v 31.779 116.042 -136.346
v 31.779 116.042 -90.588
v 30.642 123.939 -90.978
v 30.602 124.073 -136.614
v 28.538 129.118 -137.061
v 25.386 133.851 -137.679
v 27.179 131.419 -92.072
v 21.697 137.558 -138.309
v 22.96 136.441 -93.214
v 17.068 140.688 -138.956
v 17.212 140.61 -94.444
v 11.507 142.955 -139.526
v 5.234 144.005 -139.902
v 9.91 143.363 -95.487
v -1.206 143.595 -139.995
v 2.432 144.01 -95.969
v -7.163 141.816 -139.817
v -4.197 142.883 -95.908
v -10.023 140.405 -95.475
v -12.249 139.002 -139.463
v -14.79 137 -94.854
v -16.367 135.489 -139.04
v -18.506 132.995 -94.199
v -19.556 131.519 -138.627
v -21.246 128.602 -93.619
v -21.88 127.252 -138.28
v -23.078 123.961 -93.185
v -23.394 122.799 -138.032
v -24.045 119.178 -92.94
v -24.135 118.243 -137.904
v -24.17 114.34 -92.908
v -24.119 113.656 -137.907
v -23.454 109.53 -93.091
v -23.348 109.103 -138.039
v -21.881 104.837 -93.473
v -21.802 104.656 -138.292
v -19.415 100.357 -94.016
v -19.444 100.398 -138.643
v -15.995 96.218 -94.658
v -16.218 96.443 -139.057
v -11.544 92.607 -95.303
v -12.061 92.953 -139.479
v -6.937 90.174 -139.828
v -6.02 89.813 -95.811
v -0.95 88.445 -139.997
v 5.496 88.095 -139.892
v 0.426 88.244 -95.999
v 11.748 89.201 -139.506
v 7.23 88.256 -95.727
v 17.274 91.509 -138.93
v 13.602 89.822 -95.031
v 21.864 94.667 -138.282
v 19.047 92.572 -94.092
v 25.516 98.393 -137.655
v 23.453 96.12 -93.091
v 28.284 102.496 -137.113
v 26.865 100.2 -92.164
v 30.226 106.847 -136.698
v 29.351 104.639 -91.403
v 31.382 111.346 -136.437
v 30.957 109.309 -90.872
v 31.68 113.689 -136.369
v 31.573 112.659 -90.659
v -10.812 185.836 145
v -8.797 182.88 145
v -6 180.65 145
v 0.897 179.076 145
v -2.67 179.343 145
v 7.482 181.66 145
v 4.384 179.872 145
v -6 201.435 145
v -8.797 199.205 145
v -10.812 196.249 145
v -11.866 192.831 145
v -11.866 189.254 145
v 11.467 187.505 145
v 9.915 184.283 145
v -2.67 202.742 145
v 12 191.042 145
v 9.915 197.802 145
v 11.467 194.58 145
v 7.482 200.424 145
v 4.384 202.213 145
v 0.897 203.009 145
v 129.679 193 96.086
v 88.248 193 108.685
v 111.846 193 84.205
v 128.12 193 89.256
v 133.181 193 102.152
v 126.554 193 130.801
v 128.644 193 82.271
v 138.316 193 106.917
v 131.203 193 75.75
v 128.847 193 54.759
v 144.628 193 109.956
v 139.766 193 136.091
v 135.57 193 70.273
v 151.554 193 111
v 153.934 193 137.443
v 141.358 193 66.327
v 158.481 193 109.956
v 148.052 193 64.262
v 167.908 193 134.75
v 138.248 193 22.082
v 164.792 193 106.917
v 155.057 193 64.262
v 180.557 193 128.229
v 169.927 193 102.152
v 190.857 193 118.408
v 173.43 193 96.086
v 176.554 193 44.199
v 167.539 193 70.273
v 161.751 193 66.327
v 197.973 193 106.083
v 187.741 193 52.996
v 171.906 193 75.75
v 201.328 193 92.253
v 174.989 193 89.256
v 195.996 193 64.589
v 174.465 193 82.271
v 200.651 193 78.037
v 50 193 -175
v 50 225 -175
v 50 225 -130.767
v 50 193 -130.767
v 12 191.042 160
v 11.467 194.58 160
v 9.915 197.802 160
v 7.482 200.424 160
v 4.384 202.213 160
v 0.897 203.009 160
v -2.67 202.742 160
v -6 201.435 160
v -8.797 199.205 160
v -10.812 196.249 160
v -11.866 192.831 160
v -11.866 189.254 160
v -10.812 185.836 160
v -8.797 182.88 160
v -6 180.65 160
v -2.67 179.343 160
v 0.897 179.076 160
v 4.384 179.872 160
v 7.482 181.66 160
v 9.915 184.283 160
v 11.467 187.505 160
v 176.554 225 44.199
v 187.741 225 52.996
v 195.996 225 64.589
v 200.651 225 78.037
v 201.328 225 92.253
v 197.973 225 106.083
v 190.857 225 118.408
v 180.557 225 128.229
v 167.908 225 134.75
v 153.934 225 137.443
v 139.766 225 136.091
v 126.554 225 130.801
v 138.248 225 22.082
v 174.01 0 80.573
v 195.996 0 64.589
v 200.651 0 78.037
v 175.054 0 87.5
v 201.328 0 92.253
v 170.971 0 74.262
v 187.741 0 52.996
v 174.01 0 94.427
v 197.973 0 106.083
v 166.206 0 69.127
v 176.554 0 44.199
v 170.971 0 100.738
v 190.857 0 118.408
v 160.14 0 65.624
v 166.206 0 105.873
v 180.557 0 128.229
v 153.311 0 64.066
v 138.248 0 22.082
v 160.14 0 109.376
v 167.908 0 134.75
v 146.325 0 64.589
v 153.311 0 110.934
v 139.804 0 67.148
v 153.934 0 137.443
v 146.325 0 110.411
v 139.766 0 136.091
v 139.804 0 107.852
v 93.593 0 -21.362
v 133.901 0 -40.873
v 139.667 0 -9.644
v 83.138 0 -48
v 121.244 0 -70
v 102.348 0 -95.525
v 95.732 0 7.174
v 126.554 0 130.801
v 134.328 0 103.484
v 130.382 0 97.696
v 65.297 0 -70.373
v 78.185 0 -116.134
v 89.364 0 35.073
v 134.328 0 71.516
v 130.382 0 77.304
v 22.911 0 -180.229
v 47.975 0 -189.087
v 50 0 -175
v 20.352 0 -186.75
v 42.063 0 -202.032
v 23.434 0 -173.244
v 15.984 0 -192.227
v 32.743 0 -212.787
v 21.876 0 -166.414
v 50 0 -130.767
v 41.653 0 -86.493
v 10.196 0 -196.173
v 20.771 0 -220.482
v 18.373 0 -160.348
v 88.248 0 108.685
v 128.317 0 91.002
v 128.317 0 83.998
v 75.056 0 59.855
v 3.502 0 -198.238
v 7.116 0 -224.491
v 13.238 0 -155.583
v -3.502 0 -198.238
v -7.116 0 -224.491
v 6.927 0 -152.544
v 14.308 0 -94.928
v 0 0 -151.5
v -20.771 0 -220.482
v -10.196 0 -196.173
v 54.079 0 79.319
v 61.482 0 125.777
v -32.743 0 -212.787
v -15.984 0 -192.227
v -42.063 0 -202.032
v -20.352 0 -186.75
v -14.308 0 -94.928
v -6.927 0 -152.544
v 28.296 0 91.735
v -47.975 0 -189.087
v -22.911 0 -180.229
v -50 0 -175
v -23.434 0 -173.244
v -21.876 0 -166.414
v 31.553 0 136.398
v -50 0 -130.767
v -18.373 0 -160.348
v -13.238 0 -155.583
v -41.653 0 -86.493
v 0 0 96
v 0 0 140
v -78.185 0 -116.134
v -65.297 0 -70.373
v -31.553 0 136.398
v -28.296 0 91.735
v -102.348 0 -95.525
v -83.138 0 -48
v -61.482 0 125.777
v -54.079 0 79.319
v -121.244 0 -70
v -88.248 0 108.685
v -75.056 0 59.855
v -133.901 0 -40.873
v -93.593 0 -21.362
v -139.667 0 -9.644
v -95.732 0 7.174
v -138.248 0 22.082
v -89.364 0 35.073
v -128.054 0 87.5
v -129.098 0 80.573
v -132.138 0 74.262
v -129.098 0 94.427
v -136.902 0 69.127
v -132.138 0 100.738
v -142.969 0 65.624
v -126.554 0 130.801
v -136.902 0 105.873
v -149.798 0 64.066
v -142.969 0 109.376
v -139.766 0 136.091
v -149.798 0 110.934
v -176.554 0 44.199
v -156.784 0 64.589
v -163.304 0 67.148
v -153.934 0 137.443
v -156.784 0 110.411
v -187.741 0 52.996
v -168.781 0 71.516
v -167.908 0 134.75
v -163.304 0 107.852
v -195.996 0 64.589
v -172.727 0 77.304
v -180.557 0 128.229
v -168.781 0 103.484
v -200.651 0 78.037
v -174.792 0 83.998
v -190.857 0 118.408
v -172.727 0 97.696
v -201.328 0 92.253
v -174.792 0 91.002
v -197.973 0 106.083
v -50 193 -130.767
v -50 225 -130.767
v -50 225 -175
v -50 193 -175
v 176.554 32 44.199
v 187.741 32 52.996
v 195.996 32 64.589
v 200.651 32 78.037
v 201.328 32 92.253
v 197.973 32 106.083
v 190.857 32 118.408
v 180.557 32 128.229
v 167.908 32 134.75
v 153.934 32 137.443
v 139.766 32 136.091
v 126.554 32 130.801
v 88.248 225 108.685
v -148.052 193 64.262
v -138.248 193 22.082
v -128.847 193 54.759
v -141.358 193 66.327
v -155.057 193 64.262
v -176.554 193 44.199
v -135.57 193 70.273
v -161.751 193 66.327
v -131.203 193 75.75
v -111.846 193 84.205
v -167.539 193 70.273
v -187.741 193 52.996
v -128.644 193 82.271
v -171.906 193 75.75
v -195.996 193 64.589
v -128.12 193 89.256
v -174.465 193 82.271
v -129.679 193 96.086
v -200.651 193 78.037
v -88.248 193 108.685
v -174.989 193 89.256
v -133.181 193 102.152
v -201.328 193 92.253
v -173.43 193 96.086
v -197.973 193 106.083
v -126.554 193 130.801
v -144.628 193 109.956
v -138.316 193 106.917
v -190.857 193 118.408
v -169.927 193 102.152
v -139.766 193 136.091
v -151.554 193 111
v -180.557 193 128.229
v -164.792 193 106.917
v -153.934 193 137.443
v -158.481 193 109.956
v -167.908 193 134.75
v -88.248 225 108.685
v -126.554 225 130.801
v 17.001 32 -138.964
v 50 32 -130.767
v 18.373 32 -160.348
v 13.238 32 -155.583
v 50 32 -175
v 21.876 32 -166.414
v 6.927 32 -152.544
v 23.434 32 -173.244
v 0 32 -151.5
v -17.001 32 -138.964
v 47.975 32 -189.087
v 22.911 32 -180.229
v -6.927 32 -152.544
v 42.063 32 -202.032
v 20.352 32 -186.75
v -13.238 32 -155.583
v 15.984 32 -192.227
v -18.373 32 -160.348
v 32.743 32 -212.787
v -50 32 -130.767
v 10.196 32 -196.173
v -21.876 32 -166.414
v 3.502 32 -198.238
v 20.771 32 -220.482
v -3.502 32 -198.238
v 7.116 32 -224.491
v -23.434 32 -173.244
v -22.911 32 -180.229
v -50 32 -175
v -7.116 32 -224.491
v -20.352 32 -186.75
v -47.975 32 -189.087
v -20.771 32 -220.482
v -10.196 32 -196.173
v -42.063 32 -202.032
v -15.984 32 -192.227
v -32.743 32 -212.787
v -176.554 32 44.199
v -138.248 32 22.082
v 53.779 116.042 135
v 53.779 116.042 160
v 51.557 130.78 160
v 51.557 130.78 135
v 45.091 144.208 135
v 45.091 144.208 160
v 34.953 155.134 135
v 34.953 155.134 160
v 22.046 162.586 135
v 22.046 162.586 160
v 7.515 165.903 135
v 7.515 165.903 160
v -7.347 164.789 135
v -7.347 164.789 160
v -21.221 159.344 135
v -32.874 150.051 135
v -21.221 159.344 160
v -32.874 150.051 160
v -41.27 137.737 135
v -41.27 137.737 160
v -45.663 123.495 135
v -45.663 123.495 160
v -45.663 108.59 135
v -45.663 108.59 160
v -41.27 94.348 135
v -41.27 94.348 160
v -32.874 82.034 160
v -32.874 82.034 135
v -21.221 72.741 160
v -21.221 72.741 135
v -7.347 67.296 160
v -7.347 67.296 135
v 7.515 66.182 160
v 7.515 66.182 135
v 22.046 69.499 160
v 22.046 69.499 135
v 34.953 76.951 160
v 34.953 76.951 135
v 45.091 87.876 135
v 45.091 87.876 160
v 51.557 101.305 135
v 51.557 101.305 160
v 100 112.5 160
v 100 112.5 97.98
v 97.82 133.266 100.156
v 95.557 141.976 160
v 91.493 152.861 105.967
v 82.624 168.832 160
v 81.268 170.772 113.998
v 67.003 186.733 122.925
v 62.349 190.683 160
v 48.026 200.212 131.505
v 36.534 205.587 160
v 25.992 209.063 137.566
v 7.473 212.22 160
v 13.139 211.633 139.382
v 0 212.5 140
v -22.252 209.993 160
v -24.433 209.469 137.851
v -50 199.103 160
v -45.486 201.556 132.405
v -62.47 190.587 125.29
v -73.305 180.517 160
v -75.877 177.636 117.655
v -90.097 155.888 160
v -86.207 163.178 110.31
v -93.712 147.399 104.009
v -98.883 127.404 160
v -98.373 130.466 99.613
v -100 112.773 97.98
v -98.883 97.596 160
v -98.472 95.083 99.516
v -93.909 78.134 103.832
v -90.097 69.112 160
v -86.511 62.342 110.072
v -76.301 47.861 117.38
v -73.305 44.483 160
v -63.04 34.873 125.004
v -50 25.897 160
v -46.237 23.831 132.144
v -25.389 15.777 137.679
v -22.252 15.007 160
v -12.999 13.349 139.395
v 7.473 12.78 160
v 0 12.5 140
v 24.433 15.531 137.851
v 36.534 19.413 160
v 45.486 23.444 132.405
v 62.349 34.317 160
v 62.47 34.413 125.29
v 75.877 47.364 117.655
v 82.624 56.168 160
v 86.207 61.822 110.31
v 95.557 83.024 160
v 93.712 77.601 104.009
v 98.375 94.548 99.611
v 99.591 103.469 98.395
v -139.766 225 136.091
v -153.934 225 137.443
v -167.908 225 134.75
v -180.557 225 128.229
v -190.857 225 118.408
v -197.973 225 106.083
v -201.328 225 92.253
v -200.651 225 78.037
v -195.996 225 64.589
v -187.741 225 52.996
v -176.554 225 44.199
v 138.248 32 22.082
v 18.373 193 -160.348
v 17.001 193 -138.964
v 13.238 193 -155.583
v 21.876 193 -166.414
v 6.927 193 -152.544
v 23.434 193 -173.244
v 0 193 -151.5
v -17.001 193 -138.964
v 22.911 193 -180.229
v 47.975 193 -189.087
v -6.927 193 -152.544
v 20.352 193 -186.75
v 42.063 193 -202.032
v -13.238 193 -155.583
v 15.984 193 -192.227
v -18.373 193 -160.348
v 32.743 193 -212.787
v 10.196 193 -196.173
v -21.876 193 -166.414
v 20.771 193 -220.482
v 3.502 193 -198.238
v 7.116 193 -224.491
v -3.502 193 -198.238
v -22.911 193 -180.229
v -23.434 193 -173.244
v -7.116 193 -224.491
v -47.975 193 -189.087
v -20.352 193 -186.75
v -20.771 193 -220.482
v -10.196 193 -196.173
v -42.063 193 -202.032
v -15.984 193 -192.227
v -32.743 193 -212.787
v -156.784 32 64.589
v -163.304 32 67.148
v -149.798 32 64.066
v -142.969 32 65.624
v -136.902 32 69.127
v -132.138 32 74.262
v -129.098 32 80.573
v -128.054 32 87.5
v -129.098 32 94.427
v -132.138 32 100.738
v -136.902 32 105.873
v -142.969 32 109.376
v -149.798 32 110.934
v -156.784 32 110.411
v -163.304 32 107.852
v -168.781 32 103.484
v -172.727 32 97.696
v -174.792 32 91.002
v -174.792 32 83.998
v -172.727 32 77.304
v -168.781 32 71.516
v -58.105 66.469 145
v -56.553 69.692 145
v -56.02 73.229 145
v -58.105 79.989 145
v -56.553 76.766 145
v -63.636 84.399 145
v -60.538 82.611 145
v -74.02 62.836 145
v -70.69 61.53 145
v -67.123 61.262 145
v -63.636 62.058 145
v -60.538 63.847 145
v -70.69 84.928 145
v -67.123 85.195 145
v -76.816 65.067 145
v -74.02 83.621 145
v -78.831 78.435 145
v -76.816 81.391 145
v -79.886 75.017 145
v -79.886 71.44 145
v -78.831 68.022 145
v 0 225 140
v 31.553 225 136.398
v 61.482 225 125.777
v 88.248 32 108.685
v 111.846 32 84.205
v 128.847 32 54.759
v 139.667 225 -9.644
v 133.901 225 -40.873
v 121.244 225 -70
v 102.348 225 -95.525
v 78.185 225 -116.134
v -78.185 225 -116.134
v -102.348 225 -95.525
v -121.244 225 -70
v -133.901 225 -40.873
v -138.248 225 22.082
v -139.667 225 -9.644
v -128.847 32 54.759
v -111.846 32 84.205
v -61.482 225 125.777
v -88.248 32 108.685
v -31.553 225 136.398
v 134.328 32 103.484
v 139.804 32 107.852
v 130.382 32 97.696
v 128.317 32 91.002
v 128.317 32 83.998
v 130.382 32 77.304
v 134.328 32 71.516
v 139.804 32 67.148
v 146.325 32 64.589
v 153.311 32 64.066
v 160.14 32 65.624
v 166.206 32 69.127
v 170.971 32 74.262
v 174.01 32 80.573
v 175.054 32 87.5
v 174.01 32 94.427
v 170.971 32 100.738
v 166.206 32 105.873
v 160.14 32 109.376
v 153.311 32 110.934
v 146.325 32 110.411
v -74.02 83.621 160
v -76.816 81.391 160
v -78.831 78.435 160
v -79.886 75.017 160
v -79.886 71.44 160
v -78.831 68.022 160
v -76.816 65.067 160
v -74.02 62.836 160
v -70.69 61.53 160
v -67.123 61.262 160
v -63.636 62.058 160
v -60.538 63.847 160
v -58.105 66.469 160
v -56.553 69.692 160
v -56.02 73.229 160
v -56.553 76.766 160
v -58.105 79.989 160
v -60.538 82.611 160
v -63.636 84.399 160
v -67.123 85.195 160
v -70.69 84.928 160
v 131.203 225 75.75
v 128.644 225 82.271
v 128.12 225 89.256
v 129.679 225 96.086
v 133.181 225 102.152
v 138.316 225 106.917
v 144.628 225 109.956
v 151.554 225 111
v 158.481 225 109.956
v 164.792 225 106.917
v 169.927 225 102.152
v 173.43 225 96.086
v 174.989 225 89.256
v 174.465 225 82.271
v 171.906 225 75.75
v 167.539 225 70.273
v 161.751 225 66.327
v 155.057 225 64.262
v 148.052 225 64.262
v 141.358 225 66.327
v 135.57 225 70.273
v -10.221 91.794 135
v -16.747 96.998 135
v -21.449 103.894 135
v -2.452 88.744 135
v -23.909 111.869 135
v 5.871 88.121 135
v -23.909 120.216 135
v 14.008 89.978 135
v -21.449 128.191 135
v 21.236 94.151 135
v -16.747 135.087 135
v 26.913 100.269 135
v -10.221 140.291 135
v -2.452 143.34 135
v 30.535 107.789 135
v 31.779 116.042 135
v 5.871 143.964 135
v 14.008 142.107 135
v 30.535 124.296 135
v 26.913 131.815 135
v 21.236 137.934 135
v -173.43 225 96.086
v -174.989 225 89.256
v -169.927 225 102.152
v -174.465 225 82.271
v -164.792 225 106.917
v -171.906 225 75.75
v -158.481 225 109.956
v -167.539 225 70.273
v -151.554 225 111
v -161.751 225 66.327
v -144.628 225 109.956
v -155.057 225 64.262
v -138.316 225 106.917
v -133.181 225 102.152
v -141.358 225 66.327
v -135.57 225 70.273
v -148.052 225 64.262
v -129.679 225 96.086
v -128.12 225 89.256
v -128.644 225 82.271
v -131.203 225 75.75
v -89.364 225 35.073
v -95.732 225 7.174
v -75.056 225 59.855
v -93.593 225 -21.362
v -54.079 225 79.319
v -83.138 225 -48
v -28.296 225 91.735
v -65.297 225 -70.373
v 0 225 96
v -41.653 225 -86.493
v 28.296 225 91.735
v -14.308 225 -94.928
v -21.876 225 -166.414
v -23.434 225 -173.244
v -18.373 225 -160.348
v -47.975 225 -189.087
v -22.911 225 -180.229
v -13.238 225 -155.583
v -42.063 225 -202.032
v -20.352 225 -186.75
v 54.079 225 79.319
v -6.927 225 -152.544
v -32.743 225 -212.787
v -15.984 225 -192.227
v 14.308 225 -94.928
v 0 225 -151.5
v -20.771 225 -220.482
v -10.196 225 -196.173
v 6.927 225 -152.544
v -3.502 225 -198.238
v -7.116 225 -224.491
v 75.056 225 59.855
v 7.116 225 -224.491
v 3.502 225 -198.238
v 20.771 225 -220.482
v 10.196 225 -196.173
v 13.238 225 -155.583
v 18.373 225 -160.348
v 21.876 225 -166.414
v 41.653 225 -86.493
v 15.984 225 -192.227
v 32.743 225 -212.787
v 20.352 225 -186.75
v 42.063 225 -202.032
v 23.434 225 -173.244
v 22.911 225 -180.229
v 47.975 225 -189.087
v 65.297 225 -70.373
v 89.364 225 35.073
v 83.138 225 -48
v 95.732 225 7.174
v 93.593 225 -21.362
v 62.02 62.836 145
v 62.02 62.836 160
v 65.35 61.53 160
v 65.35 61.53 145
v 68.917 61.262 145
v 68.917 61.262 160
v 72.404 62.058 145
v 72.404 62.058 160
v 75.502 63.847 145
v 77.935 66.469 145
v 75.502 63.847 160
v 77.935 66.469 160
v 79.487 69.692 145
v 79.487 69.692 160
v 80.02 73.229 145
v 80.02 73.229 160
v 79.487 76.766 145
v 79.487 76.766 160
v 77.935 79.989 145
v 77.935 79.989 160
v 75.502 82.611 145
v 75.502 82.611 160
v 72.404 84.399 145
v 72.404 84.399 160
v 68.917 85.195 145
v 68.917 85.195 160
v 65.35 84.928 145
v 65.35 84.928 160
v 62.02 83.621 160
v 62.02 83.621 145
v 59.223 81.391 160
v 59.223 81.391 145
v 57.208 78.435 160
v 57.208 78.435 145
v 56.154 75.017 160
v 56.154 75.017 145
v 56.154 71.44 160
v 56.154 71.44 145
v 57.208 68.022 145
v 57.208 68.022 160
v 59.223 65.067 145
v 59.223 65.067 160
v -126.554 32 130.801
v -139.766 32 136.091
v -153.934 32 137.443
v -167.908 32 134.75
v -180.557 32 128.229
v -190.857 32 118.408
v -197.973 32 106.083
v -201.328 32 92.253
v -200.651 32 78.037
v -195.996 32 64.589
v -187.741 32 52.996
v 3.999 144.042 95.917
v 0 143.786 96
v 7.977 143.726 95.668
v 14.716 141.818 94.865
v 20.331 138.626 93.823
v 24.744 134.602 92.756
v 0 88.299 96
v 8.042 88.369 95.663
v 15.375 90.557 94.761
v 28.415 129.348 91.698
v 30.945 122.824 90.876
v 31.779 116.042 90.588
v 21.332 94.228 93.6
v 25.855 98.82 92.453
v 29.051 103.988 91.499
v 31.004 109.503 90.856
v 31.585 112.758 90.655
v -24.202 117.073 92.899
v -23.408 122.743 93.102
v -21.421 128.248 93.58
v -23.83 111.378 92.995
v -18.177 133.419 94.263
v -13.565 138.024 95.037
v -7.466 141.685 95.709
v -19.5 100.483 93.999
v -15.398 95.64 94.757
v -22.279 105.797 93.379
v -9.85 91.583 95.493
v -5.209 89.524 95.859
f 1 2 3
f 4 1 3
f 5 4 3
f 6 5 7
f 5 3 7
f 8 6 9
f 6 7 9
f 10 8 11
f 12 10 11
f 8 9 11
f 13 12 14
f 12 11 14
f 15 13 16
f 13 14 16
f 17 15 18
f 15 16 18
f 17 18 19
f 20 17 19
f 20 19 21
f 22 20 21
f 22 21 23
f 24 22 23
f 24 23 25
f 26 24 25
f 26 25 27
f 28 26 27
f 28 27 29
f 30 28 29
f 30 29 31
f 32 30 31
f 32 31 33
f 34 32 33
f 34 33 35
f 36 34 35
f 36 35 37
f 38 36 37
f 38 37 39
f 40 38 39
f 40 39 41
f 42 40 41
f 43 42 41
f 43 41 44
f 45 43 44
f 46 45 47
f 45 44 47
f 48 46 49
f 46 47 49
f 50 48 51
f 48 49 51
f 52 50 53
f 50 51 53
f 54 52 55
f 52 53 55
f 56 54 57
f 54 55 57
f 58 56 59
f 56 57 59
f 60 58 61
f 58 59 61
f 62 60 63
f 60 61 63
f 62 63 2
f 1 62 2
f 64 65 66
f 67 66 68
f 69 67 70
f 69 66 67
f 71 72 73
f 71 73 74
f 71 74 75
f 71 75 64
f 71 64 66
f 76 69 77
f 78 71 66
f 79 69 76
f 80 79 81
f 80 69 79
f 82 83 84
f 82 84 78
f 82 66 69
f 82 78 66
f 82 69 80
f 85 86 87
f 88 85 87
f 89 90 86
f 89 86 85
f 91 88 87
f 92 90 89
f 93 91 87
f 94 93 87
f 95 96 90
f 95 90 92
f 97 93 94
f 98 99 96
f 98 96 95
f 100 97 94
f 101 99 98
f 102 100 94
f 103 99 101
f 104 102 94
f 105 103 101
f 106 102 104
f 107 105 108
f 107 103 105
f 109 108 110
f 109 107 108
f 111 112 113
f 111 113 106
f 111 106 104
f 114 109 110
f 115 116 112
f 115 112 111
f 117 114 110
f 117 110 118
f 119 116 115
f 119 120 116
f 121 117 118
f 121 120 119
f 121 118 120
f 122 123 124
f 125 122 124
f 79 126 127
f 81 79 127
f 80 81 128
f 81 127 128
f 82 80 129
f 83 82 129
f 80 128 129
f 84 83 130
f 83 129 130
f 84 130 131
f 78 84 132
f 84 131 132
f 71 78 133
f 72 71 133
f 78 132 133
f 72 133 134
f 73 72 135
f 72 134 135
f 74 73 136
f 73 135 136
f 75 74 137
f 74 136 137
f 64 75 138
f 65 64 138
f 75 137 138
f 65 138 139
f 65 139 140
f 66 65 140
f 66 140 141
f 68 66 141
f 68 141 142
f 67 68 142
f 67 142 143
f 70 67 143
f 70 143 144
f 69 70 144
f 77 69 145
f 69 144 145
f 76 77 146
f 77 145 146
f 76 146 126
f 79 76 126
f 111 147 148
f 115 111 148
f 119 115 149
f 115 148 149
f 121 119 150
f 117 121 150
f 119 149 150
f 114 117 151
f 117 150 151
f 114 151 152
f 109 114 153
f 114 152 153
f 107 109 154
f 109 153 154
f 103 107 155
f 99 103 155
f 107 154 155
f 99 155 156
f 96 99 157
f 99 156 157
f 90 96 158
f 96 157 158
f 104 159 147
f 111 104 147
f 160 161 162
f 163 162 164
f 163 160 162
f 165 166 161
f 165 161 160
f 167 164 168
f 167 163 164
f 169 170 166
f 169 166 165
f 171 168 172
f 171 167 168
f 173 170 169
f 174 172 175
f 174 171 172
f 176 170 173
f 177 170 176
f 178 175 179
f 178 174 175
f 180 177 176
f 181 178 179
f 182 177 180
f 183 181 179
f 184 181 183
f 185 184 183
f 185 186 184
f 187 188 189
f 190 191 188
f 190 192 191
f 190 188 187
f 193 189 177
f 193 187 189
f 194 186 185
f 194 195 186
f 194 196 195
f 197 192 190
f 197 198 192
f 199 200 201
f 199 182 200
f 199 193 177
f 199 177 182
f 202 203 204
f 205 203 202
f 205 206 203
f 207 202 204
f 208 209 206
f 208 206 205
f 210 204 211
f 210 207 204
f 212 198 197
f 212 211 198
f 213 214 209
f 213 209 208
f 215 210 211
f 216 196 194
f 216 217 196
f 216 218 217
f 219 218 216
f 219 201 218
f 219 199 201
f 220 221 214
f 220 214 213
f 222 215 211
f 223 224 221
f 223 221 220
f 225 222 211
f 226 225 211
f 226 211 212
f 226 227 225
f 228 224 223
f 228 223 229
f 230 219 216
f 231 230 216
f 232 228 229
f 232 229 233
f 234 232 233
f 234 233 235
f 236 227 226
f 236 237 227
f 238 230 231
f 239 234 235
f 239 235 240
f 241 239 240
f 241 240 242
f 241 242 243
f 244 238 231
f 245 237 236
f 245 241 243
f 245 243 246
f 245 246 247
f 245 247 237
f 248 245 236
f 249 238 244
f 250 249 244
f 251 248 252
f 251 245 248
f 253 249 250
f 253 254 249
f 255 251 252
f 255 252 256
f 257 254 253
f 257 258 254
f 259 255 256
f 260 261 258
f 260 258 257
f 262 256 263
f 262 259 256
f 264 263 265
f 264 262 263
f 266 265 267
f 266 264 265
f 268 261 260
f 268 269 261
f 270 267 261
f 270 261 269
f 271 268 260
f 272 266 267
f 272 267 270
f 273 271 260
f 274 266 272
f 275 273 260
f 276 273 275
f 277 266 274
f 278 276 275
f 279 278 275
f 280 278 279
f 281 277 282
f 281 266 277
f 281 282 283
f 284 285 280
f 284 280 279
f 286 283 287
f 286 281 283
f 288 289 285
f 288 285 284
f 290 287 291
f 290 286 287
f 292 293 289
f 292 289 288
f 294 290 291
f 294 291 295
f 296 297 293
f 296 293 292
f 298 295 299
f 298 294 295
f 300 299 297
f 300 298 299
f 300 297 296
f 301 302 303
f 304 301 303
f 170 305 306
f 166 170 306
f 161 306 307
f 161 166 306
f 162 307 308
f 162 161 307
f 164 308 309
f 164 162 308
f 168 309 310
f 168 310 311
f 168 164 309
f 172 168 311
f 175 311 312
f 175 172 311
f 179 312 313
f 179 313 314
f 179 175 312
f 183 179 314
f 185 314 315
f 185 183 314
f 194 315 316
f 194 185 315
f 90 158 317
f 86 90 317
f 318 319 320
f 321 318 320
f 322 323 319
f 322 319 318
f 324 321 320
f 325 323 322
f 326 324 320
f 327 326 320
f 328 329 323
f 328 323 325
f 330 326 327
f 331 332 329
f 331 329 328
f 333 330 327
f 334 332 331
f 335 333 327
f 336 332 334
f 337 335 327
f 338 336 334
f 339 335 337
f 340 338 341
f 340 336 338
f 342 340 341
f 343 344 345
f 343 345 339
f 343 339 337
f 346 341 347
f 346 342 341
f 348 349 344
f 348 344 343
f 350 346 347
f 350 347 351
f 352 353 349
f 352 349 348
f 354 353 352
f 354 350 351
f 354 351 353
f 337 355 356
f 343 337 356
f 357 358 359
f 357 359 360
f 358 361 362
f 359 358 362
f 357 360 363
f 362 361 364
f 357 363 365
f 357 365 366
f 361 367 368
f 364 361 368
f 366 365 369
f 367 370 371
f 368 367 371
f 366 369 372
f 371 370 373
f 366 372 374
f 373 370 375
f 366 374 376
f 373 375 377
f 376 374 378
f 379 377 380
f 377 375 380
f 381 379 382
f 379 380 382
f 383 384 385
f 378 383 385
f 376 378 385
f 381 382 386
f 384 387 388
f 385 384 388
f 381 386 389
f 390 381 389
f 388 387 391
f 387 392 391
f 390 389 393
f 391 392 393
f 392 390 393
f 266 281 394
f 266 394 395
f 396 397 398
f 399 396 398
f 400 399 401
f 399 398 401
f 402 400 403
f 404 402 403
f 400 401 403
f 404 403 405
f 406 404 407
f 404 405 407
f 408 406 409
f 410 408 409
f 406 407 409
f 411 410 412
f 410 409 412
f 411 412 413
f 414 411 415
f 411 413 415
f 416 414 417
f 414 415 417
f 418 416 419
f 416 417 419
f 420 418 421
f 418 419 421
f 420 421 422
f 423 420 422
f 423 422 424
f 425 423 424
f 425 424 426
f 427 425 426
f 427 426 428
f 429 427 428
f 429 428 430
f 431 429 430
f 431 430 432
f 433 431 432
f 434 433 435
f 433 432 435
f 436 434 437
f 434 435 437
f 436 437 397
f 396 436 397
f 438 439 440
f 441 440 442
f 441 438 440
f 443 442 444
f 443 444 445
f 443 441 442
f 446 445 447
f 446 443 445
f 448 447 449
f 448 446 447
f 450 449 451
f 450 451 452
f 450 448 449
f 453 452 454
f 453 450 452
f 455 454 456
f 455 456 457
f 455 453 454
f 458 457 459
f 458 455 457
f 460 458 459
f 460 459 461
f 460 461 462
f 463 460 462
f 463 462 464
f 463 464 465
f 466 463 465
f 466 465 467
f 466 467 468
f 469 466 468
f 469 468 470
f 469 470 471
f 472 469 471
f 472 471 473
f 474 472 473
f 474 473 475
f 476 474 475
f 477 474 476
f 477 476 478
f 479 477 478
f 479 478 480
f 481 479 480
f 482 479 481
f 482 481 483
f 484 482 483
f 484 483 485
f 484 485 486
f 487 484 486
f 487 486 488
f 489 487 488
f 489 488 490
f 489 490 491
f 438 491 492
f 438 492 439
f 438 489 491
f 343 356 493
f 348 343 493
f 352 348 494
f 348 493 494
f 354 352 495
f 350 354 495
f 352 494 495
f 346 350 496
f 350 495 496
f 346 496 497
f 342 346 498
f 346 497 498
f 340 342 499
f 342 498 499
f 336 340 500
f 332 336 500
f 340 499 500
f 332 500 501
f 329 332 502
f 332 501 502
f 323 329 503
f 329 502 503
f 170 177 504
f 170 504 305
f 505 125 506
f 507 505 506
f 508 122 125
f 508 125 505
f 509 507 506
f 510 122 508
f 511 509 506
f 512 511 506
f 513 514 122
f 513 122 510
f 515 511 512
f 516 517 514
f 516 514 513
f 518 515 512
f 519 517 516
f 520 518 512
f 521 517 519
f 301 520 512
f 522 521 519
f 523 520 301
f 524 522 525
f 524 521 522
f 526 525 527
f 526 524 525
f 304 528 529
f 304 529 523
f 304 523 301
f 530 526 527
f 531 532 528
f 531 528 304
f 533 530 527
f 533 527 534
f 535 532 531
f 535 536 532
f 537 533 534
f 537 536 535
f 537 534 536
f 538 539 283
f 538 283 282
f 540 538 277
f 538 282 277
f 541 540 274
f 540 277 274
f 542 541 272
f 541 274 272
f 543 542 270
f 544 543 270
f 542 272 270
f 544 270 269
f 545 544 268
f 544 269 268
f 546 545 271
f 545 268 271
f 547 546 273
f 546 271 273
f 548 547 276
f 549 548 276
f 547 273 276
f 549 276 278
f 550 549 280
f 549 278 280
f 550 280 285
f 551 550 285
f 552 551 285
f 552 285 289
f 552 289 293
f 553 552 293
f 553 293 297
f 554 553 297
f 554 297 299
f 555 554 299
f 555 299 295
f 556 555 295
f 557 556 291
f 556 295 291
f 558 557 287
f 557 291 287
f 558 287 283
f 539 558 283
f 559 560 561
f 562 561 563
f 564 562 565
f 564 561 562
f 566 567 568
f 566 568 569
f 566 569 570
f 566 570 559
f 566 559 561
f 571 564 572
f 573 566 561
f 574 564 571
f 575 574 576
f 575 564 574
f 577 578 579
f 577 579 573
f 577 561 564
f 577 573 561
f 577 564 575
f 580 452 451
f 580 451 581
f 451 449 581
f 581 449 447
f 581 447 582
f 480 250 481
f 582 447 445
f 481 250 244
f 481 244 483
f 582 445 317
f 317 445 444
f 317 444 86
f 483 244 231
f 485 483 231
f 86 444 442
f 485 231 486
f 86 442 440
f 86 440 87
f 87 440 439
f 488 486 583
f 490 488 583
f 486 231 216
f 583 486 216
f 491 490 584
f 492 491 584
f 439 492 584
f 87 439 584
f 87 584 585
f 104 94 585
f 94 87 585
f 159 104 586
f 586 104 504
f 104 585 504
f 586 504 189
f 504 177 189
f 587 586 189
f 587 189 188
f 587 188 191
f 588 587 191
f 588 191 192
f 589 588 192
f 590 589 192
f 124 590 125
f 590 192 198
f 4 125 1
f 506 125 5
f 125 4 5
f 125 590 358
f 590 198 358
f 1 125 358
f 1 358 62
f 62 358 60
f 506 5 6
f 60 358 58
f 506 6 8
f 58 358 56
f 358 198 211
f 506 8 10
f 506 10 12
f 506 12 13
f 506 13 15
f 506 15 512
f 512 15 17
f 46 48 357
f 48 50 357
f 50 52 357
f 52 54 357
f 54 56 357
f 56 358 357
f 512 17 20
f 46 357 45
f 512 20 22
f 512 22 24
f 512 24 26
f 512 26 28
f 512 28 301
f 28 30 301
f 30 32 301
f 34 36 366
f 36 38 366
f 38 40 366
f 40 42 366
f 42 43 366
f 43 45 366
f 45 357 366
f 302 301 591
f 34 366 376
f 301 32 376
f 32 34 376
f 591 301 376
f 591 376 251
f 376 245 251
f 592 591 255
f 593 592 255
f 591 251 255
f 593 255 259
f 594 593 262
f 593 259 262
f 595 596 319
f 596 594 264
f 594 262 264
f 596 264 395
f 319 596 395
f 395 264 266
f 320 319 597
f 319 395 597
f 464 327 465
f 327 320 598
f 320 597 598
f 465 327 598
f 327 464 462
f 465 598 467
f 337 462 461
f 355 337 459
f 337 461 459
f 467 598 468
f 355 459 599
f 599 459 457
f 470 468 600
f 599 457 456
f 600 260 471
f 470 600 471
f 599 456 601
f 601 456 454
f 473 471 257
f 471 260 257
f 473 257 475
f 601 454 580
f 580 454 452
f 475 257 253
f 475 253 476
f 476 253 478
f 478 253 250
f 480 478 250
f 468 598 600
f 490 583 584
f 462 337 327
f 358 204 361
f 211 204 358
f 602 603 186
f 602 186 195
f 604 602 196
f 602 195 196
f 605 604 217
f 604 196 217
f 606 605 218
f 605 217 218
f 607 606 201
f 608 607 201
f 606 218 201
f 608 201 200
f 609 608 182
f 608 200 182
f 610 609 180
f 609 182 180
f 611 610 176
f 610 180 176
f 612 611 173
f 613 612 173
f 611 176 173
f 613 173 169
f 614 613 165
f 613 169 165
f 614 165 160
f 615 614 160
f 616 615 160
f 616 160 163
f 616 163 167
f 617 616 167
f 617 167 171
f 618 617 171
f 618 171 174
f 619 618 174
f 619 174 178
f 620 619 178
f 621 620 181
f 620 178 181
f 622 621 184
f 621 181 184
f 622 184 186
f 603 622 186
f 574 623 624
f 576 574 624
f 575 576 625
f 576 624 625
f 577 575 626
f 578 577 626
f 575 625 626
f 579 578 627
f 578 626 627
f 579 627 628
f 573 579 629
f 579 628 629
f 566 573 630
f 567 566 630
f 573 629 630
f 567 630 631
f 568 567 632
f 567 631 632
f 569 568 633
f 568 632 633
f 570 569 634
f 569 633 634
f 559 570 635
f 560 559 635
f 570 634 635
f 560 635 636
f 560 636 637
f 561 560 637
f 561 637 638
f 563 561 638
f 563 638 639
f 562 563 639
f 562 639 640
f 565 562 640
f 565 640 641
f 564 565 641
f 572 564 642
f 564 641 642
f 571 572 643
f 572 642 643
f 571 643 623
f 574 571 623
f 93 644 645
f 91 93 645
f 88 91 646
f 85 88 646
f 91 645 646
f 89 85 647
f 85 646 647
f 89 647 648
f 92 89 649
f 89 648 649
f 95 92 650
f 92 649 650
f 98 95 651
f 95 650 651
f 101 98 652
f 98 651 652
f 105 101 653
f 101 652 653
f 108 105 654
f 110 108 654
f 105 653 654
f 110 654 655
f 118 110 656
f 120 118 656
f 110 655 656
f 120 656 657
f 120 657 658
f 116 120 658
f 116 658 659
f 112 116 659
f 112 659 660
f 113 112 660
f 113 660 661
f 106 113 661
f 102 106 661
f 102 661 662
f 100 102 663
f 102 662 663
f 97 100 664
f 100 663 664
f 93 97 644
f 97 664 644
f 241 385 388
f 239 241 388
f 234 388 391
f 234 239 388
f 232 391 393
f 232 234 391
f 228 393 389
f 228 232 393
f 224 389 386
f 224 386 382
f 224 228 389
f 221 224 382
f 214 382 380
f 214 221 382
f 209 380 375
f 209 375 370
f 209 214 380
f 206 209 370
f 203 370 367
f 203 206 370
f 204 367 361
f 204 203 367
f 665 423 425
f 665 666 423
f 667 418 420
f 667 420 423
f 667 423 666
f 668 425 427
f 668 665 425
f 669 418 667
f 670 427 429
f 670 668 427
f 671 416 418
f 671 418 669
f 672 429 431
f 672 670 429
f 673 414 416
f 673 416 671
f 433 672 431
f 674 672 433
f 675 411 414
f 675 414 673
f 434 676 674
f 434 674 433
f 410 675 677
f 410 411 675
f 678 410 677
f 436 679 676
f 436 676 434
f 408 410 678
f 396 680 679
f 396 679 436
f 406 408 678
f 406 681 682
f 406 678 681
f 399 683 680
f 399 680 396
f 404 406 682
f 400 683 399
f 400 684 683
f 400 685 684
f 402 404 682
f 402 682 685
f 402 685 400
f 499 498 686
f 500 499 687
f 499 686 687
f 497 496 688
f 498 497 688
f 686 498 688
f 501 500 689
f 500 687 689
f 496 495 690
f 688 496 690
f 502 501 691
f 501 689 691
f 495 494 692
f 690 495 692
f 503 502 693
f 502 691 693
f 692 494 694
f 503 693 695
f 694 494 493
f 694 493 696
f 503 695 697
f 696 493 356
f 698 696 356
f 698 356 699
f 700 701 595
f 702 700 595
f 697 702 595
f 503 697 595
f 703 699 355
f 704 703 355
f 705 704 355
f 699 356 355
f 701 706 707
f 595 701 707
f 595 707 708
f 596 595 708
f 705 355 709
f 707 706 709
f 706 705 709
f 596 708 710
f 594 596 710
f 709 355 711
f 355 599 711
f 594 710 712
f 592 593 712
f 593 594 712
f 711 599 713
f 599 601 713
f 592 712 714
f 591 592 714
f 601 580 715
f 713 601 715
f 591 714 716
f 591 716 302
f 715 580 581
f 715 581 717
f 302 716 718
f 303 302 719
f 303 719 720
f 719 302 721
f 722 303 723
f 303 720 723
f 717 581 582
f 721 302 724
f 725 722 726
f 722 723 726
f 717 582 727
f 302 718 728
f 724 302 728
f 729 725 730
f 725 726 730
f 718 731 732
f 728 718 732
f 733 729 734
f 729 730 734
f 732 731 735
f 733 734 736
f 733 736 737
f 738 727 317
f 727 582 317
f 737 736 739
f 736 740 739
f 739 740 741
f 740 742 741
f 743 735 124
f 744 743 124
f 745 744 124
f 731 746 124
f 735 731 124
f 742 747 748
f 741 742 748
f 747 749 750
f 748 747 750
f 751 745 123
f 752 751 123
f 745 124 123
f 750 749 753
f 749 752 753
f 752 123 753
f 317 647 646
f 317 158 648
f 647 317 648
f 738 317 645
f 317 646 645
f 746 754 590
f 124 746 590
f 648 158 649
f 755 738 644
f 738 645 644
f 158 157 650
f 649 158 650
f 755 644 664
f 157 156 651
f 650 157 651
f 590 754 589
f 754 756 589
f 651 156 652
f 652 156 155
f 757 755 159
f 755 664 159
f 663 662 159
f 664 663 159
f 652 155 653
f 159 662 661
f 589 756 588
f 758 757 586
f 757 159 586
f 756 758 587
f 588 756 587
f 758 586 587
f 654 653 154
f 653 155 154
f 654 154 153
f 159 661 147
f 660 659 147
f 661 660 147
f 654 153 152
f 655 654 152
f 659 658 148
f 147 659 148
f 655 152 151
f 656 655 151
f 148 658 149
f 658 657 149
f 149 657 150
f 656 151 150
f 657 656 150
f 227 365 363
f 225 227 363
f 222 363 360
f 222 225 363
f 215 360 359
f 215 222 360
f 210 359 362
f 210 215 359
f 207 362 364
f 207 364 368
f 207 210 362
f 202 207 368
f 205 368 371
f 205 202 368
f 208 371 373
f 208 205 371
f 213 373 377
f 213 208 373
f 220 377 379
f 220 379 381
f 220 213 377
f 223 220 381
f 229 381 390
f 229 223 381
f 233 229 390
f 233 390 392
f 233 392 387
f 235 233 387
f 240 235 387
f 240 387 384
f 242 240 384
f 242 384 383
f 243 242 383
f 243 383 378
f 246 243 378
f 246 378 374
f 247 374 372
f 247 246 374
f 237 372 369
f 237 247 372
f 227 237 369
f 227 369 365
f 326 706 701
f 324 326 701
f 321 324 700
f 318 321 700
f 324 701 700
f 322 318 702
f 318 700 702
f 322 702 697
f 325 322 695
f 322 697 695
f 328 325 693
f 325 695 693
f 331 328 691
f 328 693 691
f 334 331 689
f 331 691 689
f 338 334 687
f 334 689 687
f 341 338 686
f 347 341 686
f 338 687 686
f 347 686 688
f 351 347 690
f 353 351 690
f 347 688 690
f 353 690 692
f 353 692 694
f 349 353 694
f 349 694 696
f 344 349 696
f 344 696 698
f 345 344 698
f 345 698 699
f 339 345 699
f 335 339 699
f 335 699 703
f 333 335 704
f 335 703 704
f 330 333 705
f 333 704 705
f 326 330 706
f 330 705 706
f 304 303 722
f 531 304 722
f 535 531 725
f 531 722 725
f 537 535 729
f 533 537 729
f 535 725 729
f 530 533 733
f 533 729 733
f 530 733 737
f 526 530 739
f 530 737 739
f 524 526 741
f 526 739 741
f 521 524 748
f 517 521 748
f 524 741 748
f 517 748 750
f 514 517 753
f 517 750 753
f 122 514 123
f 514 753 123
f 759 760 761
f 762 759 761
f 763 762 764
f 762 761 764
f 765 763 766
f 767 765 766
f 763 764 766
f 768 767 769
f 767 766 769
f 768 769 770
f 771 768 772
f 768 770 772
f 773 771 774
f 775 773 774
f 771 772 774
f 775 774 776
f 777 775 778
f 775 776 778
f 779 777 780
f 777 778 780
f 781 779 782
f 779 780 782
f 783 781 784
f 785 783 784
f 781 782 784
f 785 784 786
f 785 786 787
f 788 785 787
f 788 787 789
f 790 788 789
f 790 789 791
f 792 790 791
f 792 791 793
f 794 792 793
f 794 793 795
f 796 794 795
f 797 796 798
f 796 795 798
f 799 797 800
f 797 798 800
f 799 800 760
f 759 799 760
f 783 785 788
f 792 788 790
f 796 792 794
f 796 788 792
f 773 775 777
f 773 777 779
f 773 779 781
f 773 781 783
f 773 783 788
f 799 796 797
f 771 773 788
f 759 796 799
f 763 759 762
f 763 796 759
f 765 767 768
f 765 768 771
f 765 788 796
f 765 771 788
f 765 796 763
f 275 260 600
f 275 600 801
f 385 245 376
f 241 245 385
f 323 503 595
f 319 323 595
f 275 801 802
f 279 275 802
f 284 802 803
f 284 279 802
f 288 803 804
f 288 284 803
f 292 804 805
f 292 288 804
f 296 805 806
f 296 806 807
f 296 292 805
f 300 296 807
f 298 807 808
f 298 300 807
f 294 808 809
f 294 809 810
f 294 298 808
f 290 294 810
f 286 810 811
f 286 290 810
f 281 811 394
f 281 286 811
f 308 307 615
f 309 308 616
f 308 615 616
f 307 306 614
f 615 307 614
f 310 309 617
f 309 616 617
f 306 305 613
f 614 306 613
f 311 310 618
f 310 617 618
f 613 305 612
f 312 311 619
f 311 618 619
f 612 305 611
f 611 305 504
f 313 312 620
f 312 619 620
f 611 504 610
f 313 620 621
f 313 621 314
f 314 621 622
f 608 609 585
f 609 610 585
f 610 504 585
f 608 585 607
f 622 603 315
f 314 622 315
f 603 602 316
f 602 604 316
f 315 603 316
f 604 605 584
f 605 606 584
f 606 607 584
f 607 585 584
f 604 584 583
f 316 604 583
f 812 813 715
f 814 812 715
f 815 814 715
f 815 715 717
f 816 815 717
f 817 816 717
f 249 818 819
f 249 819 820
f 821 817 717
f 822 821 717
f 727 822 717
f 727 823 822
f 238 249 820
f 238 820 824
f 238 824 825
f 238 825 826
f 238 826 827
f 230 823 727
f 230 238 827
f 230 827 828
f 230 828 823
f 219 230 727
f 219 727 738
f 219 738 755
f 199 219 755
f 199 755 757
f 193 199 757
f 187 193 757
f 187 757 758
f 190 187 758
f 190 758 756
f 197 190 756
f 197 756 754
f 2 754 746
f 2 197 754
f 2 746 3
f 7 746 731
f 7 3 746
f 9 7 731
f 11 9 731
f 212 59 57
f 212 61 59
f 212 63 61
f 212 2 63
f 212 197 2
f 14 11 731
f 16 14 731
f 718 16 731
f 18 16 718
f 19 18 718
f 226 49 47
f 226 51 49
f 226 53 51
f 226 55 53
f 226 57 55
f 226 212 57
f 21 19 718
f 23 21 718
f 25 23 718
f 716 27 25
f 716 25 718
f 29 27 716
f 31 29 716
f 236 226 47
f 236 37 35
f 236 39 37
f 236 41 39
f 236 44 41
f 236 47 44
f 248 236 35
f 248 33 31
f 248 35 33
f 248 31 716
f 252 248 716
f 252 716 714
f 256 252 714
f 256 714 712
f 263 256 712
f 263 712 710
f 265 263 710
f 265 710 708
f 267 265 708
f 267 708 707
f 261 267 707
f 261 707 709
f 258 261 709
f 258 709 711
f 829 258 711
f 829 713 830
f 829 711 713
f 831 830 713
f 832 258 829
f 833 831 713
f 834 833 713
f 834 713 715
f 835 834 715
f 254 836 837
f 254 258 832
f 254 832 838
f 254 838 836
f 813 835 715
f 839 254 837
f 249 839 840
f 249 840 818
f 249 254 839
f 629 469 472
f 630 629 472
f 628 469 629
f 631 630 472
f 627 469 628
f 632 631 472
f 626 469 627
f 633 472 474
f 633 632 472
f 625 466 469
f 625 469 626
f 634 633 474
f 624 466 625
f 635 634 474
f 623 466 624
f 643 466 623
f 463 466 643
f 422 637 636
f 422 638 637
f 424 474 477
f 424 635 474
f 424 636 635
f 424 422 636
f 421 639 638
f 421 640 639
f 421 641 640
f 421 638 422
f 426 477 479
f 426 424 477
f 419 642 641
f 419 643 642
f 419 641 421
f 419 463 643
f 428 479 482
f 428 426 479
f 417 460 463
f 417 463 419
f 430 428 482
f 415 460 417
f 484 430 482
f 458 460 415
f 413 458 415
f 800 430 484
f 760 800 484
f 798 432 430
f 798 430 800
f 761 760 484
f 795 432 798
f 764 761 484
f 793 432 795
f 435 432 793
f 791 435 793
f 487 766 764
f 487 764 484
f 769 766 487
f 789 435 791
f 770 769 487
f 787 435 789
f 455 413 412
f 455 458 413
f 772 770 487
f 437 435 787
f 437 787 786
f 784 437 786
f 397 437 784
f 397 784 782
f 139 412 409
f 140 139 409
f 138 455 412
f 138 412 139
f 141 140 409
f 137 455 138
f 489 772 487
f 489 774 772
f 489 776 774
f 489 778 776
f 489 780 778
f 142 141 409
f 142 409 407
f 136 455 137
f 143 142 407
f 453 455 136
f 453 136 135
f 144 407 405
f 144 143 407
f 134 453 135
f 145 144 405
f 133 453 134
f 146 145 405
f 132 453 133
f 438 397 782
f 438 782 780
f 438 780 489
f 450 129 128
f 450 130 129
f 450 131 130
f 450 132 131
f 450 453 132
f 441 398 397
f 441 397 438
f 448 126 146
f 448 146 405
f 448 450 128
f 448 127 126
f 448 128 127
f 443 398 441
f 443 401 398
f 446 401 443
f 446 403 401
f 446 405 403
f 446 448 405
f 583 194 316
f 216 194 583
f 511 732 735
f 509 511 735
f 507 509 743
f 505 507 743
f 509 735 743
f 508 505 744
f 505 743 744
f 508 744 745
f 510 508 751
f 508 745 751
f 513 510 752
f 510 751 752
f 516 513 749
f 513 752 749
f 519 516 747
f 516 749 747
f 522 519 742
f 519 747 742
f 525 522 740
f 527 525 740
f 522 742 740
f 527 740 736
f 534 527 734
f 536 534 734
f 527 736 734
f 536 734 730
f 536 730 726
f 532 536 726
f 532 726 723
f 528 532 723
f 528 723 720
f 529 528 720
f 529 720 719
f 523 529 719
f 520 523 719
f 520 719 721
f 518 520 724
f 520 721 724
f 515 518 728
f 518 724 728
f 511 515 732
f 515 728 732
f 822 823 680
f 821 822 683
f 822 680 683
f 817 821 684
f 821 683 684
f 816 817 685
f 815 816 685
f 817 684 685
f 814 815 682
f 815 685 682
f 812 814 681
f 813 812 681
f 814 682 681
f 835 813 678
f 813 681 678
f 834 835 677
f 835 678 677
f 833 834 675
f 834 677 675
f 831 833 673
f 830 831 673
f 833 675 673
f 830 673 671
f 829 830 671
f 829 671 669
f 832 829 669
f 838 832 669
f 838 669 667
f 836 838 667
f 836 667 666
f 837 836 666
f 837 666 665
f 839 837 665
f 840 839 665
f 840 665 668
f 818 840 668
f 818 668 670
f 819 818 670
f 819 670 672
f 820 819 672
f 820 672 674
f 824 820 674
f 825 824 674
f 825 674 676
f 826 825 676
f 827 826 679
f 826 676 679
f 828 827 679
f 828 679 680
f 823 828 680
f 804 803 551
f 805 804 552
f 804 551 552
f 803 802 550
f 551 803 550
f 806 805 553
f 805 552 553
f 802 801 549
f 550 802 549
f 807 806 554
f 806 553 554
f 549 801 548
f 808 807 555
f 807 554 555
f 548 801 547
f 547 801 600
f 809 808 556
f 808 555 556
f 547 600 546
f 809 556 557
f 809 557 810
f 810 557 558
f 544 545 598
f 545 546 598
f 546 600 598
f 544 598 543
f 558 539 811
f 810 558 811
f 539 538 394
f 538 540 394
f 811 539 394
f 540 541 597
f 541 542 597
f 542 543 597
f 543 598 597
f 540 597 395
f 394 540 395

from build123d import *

# Parameters (mm, degrees)
SKETCH1_R                = 140
SKETCH1_R_2              = 96
BOSS_EXTRUDE1_DEPTH      = 225
SKETCH2_R                = 23.5
BOSS_EXTRUDE2_DEPTH      = 32
CIRPATTERN1_COUNT        = 3
MIRROR1_COPY_1_SKETCH_R  = 23.5
MIRROR1_COPY_1_DEPTH     = 32
MIRROR1_COPY_2_SKETCH_R  = 23.5
MIRROR1_COPY_2_DEPTH     = 32
BOSS_EXTRUDE3_REACH      = 491.361
BOSS_EXTRUDE3_END_RADIUS = 140
SKETCH3_R                = 100
SKETCH4_R                = 50
CUT_EXTRUDE1_DEPTH       = 25
SKETCH5_R                = 28
CUT_EXTRUDE2_DEPTH       = 470.945948606
SKETCH7_R                = 12
CUT_EXTRUDE3_DEPTH       = 15
CIRPATTERN2_COUNT        = 3


with BuildPart() as part:
    # Sketch1 → Boss-Extrude1 (new body)
    with BuildSketch(Plane(origin=(0, 0, 0), x_dir=(1, 0, 0), z_dir=(0, 1, 0))):
        with Locations(Location((0, 0, 0), (0, 0, 270))):
            Circle(SKETCH1_R)
        with Locations(Location((0, 0, 0), (0, 0, 270))):
            Circle(SKETCH1_R_2, mode=Mode.SUBTRACT)
    extrude(amount=BOSS_EXTRUDE1_DEPTH)

    # Sketch2 → Boss-Extrude2 (add)
    with BuildSketch(Plane(origin=(0, 225, 0), x_dir=(1, 0, 0), z_dir=(0, 1, 0))):
        with BuildLine():
            Line((50, 175), (50, 130.766968306))
            Line((50, 130.766968306), (-50, 130.766968306))
            Line((-50, 130.766968306), (-50, 175))
            ThreePointArc((-50, 175), (0, 225), (50, 175))
        make_face()
        with Locations(Location((0, 175, 0), (0, 0, 270))):
            Circle(SKETCH2_R, mode=Mode.SUBTRACT)
    boss_extrude2 = extrude(amount=-BOSS_EXTRUDE2_DEPTH)

    # CirPattern1: Boss-Extrude2 ×3 about axis
    cirpattern1_axis = Axis((0, 0, 0), (0, 1, 0))
    for i in range(1, CIRPATTERN1_COUNT):
        add(boss_extrude2.rotate(cirpattern1_axis, i * 360 / CIRPATTERN1_COUNT))

    # Mirror1: Boss-Extrude2 across plane
    add(boss_extrude2.mirror(Plane.ZX.offset(112.5)))

    # Mirror1 copy 1 sketch → Mirror1 copy 1 (add)
    with BuildSketch(Plane(origin=(0, 0, 0), x_dir=(-0.4999999999999998, 0, -0.8660254037844387), z_dir=(0, -1, 0))):
        with BuildLine():
            Line((50, -175), (50, -130.766968306))
            Line((50, -130.766968306), (-50, -130.766968306))
            Line((-50, -130.766968306), (-50, -175))
            ThreePointArc((-50, -175), (0, -225), (50, -175))
        make_face()
        with Locations((0, -175)):
            Circle(MIRROR1_COPY_1_SKETCH_R, mode=Mode.SUBTRACT)
    extrude(amount=-MIRROR1_COPY_1_DEPTH)

    # Mirror1 copy 2 sketch → Mirror1 copy 2 (add)
    with BuildSketch(Plane(origin=(0, 0, 0), x_dir=(-0.5000000000000004, 0, 0.8660254037844384), z_dir=(0, -1, 0))):
        with BuildLine():
            Line((50, -175), (50, -130.766968306))
            Line((50, -130.766968306), (-50, -130.766968306))
            Line((-50, -130.766968306), (-50, -175))
            ThreePointArc((-50, -175), (0, -225), (50, -175))
        make_face()
        with Locations((0, -175)):
            Circle(MIRROR1_COPY_2_SKETCH_R, mode=Mode.SUBTRACT)
    extrude(amount=-MIRROR1_COPY_2_DEPTH)

    # Boss-Extrude3: up to this cylinder (the profile starts outside it)
    boss_extrude3_end = Plane(origin=(0, 112.5, 0), z_dir=(0, -1, 0)) * Cylinder(BOSS_EXTRUDE3_END_RADIUS, 1263.722, mode=Mode.PRIVATE)
    # Sketch3 → Boss-Extrude3 (add, up to the surface)
    with BuildSketch(Plane.XY.offset(160), mode=Mode.PRIVATE) as boss_extrude3_sk1:
        with Locations((0, 112.5)):
            Circle(SKETCH3_R)
    boss_extrude3_tool1 = extrude(boss_extrude3_sk1.sketch, amount=-BOSS_EXTRUDE3_REACH, mode=Mode.PRIVATE) - boss_extrude3_end
    add(boss_extrude3_tool1.solids().sort_by_distance((0, 112.5, 160))[0])

    # Sketch4 → Cut-Extrude1 (cut)
    with BuildSketch(Plane.XY.offset(160)):
        with Locations((3.778615411, 116.042451948)):
            Circle(SKETCH4_R)
    extrude(amount=-CUT_EXTRUDE1_DEPTH, mode=Mode.SUBTRACT)

    # Sketch5 → Cut-Extrude2 (cut, through all)
    with BuildSketch(Plane.XY.offset(135)):
        with Locations((3.778615411, 116.042451948)):
            Circle(SKETCH5_R)
    extrude(amount=-CUT_EXTRUDE2_DEPTH, mode=Mode.SUBTRACT)

    # Sketch7 → Cut-Extrude3 (cut)
    with BuildSketch(Plane.XY.offset(160)):
        with Locations((0, 191.042451948)):
            Circle(SKETCH7_R)
    cut_extrude3 = extrude(amount=-CUT_EXTRUDE3_DEPTH, mode=Mode.SUBTRACT)

    # CirPattern2: Cut-Extrude3 ×3 about axis
    cirpattern2_axis = Axis((0, 112.5, 0), (0, 0, 1))
    for i in range(1, CIRPATTERN2_COUNT):
        add(cut_extrude3.rotate(cirpattern2_axis, i * 360 / CIRPATTERN2_COUNT), mode=Mode.SUBTRACT)


solid = part.part
